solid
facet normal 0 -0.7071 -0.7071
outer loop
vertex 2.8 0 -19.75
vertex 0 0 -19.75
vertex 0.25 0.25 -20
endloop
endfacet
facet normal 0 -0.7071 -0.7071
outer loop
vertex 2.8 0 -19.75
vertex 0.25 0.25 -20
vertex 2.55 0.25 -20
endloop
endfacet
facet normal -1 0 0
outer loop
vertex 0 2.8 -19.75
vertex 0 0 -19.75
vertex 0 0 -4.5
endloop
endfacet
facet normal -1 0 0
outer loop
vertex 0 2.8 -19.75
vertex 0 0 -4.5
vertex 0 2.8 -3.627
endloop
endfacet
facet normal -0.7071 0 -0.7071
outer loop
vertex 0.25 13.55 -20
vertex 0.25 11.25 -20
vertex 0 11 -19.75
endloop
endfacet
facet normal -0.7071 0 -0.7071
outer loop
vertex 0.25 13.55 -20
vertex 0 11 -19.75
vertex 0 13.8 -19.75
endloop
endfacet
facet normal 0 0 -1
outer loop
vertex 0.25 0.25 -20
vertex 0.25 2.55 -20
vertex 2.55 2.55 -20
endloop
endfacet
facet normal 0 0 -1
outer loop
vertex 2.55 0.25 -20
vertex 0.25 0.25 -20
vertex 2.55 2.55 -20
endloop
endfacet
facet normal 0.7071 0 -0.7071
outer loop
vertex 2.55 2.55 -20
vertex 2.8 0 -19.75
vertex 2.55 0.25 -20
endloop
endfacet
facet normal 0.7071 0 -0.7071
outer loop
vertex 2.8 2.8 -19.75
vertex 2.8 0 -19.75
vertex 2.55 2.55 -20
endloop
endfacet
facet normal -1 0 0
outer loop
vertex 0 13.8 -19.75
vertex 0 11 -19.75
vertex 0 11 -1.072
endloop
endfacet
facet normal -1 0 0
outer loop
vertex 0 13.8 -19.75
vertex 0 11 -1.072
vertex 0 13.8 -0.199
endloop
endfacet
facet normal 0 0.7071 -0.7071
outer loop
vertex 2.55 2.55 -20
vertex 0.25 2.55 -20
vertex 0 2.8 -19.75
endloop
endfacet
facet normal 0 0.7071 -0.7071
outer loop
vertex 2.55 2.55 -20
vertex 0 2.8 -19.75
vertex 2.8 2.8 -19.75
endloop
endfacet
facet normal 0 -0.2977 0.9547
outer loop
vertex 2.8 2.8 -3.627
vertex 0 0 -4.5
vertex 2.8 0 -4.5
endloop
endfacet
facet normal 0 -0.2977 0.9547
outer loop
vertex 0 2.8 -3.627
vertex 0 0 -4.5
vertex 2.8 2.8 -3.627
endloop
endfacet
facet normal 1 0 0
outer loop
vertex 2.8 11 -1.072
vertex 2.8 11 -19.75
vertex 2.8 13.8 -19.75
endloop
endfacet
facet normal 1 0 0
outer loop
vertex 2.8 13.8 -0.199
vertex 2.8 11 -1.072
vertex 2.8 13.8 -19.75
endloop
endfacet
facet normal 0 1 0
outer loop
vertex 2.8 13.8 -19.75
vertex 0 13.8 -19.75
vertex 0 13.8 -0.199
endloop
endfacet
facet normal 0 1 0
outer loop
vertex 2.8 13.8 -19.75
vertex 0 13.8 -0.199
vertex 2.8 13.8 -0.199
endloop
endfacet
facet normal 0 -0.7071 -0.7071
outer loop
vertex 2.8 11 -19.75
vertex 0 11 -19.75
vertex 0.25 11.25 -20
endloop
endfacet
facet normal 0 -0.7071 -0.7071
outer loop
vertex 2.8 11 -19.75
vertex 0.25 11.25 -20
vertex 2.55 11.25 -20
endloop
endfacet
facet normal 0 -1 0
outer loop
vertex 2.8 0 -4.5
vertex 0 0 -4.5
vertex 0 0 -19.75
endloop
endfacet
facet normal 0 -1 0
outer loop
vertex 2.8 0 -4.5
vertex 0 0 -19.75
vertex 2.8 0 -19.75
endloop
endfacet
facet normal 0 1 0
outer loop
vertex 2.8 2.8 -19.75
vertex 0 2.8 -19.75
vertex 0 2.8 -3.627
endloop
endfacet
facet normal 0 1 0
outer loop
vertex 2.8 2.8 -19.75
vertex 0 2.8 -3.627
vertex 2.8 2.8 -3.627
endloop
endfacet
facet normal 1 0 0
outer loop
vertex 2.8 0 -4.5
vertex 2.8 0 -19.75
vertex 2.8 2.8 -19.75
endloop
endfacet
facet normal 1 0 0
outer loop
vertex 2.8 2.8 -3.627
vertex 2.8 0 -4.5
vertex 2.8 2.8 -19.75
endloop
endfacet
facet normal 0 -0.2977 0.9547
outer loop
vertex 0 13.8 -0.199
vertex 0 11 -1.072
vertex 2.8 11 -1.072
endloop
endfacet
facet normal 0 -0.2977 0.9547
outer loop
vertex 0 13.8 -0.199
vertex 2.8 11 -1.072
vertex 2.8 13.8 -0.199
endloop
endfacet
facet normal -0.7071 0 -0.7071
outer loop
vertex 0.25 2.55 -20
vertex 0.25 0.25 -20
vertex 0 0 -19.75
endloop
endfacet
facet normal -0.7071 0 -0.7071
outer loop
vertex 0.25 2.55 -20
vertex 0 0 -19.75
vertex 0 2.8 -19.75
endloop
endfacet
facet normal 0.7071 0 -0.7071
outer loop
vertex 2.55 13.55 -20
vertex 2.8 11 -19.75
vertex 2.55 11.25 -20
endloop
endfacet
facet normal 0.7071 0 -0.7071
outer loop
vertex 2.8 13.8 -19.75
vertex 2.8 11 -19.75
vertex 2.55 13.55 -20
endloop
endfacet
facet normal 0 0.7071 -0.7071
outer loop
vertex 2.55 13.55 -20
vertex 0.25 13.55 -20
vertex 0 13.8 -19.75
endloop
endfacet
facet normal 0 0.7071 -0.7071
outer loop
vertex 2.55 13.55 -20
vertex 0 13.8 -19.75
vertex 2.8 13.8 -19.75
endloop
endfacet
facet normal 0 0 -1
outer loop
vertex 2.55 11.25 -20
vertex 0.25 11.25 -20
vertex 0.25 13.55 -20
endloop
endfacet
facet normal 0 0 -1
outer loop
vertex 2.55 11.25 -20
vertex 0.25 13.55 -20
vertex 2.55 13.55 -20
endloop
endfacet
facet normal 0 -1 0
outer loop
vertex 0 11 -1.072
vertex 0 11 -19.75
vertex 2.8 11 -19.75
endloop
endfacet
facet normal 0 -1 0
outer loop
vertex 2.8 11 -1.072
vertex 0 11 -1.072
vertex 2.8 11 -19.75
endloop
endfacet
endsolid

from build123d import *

# Parameters (mm, degrees)
SKETCH1_W               = 2.8
SKETCH1_H               = 2.8
BOSS_EXTRUDE1_DEPTH     = 20
BOSS_EXTRUDE1_2_DEPTH   = 20
CUT_EXTRUDE1_DEPTH      = 25.459762877
CUT_EXTRUDE1_DEPTH_BACK = 25.459762877
CHAMFER1_SIZE           = 0.25
CHAMFER2_SIZE           = 0.25


with BuildPart() as part:
    # Sketch1 → Boss-Extrude1 (new body)
    with BuildSketch(Plane.XY):
        with Locations((1.4, 12.4)):
            Rectangle(SKETCH1_W, SKETCH1_H)
    extrude(amount=-BOSS_EXTRUDE1_DEPTH)


with BuildPart() as body_2:
    # Sketch1 → Boss-Extrude1 2 (new body)
    with BuildSketch(Plane.XY):
        with Locations((1.4, 1.4)):
            Rectangle(SKETCH1_W, SKETCH1_H)
    extrude(amount=-BOSS_EXTRUDE1_2_DEPTH)


with BuildPart() as cut_extrude1_tool:
    # Sketch2 → Cut-Extrude1 (new, two sides: drawn at the far end of the back side and taken through both)
    with BuildSketch(Plane(origin=(2.8, 0, 0), x_dir=(0, 0, -1), z_dir=(1, 0, 0)).offset(-CUT_EXTRUDE1_DEPTH_BACK)):
        Polygon((0, 2.8), (3.627360986, 2.8), (-1.733135817, 20), (-2.733135817, 20), (-2.733135817, 0), (0, 0), align=None)
        Polygon((5.123313582, -2), (4.5, 0), (0, 0), (-2.733135817, 0), (-2.733135817, -2), align=None)
        Polygon((0, 0), (4.5, 0), (3.627360986, 2.8), (0, 2.8), align=None)
    extrude(amount=CUT_EXTRUDE1_DEPTH + CUT_EXTRUDE1_DEPTH_BACK)


with BuildPart() as part_1:
    add(part.part)

    # Cut-Extrude1: cut by cut_extrude1_tool
    add(cut_extrude1_tool.part, mode=Mode.SUBTRACT)

    # Chamfer2
    chamfer2_edges = [part_1.edges().sort_by_distance(p)[0] for p in [
        (2.8, 12.4, -20),
        (1.4, 13.8, -20),
        (0, 12.4, -20),
        (1.4, 11, -20),
    ]]
    chamfer(chamfer2_edges, length=CHAMFER2_SIZE)


with BuildPart() as body_2_1:
    add(body_2.part)

    # Cut-Extrude1: cut by cut_extrude1_tool
    add(cut_extrude1_tool.part, mode=Mode.SUBTRACT)

    # Chamfer1
    chamfer1_edges = [body_2_1.edges().sort_by_distance(p)[0] for p in [
        (1.4, 2.8, -20),
        (0, 1.4, -20),
        (1.4, 0, -20),
        (2.8, 1.4, -20),
    ]]
    chamfer(chamfer1_edges, length=CHAMFER1_SIZE)


solid = Compound([part_1.part, body_2_1.part])
